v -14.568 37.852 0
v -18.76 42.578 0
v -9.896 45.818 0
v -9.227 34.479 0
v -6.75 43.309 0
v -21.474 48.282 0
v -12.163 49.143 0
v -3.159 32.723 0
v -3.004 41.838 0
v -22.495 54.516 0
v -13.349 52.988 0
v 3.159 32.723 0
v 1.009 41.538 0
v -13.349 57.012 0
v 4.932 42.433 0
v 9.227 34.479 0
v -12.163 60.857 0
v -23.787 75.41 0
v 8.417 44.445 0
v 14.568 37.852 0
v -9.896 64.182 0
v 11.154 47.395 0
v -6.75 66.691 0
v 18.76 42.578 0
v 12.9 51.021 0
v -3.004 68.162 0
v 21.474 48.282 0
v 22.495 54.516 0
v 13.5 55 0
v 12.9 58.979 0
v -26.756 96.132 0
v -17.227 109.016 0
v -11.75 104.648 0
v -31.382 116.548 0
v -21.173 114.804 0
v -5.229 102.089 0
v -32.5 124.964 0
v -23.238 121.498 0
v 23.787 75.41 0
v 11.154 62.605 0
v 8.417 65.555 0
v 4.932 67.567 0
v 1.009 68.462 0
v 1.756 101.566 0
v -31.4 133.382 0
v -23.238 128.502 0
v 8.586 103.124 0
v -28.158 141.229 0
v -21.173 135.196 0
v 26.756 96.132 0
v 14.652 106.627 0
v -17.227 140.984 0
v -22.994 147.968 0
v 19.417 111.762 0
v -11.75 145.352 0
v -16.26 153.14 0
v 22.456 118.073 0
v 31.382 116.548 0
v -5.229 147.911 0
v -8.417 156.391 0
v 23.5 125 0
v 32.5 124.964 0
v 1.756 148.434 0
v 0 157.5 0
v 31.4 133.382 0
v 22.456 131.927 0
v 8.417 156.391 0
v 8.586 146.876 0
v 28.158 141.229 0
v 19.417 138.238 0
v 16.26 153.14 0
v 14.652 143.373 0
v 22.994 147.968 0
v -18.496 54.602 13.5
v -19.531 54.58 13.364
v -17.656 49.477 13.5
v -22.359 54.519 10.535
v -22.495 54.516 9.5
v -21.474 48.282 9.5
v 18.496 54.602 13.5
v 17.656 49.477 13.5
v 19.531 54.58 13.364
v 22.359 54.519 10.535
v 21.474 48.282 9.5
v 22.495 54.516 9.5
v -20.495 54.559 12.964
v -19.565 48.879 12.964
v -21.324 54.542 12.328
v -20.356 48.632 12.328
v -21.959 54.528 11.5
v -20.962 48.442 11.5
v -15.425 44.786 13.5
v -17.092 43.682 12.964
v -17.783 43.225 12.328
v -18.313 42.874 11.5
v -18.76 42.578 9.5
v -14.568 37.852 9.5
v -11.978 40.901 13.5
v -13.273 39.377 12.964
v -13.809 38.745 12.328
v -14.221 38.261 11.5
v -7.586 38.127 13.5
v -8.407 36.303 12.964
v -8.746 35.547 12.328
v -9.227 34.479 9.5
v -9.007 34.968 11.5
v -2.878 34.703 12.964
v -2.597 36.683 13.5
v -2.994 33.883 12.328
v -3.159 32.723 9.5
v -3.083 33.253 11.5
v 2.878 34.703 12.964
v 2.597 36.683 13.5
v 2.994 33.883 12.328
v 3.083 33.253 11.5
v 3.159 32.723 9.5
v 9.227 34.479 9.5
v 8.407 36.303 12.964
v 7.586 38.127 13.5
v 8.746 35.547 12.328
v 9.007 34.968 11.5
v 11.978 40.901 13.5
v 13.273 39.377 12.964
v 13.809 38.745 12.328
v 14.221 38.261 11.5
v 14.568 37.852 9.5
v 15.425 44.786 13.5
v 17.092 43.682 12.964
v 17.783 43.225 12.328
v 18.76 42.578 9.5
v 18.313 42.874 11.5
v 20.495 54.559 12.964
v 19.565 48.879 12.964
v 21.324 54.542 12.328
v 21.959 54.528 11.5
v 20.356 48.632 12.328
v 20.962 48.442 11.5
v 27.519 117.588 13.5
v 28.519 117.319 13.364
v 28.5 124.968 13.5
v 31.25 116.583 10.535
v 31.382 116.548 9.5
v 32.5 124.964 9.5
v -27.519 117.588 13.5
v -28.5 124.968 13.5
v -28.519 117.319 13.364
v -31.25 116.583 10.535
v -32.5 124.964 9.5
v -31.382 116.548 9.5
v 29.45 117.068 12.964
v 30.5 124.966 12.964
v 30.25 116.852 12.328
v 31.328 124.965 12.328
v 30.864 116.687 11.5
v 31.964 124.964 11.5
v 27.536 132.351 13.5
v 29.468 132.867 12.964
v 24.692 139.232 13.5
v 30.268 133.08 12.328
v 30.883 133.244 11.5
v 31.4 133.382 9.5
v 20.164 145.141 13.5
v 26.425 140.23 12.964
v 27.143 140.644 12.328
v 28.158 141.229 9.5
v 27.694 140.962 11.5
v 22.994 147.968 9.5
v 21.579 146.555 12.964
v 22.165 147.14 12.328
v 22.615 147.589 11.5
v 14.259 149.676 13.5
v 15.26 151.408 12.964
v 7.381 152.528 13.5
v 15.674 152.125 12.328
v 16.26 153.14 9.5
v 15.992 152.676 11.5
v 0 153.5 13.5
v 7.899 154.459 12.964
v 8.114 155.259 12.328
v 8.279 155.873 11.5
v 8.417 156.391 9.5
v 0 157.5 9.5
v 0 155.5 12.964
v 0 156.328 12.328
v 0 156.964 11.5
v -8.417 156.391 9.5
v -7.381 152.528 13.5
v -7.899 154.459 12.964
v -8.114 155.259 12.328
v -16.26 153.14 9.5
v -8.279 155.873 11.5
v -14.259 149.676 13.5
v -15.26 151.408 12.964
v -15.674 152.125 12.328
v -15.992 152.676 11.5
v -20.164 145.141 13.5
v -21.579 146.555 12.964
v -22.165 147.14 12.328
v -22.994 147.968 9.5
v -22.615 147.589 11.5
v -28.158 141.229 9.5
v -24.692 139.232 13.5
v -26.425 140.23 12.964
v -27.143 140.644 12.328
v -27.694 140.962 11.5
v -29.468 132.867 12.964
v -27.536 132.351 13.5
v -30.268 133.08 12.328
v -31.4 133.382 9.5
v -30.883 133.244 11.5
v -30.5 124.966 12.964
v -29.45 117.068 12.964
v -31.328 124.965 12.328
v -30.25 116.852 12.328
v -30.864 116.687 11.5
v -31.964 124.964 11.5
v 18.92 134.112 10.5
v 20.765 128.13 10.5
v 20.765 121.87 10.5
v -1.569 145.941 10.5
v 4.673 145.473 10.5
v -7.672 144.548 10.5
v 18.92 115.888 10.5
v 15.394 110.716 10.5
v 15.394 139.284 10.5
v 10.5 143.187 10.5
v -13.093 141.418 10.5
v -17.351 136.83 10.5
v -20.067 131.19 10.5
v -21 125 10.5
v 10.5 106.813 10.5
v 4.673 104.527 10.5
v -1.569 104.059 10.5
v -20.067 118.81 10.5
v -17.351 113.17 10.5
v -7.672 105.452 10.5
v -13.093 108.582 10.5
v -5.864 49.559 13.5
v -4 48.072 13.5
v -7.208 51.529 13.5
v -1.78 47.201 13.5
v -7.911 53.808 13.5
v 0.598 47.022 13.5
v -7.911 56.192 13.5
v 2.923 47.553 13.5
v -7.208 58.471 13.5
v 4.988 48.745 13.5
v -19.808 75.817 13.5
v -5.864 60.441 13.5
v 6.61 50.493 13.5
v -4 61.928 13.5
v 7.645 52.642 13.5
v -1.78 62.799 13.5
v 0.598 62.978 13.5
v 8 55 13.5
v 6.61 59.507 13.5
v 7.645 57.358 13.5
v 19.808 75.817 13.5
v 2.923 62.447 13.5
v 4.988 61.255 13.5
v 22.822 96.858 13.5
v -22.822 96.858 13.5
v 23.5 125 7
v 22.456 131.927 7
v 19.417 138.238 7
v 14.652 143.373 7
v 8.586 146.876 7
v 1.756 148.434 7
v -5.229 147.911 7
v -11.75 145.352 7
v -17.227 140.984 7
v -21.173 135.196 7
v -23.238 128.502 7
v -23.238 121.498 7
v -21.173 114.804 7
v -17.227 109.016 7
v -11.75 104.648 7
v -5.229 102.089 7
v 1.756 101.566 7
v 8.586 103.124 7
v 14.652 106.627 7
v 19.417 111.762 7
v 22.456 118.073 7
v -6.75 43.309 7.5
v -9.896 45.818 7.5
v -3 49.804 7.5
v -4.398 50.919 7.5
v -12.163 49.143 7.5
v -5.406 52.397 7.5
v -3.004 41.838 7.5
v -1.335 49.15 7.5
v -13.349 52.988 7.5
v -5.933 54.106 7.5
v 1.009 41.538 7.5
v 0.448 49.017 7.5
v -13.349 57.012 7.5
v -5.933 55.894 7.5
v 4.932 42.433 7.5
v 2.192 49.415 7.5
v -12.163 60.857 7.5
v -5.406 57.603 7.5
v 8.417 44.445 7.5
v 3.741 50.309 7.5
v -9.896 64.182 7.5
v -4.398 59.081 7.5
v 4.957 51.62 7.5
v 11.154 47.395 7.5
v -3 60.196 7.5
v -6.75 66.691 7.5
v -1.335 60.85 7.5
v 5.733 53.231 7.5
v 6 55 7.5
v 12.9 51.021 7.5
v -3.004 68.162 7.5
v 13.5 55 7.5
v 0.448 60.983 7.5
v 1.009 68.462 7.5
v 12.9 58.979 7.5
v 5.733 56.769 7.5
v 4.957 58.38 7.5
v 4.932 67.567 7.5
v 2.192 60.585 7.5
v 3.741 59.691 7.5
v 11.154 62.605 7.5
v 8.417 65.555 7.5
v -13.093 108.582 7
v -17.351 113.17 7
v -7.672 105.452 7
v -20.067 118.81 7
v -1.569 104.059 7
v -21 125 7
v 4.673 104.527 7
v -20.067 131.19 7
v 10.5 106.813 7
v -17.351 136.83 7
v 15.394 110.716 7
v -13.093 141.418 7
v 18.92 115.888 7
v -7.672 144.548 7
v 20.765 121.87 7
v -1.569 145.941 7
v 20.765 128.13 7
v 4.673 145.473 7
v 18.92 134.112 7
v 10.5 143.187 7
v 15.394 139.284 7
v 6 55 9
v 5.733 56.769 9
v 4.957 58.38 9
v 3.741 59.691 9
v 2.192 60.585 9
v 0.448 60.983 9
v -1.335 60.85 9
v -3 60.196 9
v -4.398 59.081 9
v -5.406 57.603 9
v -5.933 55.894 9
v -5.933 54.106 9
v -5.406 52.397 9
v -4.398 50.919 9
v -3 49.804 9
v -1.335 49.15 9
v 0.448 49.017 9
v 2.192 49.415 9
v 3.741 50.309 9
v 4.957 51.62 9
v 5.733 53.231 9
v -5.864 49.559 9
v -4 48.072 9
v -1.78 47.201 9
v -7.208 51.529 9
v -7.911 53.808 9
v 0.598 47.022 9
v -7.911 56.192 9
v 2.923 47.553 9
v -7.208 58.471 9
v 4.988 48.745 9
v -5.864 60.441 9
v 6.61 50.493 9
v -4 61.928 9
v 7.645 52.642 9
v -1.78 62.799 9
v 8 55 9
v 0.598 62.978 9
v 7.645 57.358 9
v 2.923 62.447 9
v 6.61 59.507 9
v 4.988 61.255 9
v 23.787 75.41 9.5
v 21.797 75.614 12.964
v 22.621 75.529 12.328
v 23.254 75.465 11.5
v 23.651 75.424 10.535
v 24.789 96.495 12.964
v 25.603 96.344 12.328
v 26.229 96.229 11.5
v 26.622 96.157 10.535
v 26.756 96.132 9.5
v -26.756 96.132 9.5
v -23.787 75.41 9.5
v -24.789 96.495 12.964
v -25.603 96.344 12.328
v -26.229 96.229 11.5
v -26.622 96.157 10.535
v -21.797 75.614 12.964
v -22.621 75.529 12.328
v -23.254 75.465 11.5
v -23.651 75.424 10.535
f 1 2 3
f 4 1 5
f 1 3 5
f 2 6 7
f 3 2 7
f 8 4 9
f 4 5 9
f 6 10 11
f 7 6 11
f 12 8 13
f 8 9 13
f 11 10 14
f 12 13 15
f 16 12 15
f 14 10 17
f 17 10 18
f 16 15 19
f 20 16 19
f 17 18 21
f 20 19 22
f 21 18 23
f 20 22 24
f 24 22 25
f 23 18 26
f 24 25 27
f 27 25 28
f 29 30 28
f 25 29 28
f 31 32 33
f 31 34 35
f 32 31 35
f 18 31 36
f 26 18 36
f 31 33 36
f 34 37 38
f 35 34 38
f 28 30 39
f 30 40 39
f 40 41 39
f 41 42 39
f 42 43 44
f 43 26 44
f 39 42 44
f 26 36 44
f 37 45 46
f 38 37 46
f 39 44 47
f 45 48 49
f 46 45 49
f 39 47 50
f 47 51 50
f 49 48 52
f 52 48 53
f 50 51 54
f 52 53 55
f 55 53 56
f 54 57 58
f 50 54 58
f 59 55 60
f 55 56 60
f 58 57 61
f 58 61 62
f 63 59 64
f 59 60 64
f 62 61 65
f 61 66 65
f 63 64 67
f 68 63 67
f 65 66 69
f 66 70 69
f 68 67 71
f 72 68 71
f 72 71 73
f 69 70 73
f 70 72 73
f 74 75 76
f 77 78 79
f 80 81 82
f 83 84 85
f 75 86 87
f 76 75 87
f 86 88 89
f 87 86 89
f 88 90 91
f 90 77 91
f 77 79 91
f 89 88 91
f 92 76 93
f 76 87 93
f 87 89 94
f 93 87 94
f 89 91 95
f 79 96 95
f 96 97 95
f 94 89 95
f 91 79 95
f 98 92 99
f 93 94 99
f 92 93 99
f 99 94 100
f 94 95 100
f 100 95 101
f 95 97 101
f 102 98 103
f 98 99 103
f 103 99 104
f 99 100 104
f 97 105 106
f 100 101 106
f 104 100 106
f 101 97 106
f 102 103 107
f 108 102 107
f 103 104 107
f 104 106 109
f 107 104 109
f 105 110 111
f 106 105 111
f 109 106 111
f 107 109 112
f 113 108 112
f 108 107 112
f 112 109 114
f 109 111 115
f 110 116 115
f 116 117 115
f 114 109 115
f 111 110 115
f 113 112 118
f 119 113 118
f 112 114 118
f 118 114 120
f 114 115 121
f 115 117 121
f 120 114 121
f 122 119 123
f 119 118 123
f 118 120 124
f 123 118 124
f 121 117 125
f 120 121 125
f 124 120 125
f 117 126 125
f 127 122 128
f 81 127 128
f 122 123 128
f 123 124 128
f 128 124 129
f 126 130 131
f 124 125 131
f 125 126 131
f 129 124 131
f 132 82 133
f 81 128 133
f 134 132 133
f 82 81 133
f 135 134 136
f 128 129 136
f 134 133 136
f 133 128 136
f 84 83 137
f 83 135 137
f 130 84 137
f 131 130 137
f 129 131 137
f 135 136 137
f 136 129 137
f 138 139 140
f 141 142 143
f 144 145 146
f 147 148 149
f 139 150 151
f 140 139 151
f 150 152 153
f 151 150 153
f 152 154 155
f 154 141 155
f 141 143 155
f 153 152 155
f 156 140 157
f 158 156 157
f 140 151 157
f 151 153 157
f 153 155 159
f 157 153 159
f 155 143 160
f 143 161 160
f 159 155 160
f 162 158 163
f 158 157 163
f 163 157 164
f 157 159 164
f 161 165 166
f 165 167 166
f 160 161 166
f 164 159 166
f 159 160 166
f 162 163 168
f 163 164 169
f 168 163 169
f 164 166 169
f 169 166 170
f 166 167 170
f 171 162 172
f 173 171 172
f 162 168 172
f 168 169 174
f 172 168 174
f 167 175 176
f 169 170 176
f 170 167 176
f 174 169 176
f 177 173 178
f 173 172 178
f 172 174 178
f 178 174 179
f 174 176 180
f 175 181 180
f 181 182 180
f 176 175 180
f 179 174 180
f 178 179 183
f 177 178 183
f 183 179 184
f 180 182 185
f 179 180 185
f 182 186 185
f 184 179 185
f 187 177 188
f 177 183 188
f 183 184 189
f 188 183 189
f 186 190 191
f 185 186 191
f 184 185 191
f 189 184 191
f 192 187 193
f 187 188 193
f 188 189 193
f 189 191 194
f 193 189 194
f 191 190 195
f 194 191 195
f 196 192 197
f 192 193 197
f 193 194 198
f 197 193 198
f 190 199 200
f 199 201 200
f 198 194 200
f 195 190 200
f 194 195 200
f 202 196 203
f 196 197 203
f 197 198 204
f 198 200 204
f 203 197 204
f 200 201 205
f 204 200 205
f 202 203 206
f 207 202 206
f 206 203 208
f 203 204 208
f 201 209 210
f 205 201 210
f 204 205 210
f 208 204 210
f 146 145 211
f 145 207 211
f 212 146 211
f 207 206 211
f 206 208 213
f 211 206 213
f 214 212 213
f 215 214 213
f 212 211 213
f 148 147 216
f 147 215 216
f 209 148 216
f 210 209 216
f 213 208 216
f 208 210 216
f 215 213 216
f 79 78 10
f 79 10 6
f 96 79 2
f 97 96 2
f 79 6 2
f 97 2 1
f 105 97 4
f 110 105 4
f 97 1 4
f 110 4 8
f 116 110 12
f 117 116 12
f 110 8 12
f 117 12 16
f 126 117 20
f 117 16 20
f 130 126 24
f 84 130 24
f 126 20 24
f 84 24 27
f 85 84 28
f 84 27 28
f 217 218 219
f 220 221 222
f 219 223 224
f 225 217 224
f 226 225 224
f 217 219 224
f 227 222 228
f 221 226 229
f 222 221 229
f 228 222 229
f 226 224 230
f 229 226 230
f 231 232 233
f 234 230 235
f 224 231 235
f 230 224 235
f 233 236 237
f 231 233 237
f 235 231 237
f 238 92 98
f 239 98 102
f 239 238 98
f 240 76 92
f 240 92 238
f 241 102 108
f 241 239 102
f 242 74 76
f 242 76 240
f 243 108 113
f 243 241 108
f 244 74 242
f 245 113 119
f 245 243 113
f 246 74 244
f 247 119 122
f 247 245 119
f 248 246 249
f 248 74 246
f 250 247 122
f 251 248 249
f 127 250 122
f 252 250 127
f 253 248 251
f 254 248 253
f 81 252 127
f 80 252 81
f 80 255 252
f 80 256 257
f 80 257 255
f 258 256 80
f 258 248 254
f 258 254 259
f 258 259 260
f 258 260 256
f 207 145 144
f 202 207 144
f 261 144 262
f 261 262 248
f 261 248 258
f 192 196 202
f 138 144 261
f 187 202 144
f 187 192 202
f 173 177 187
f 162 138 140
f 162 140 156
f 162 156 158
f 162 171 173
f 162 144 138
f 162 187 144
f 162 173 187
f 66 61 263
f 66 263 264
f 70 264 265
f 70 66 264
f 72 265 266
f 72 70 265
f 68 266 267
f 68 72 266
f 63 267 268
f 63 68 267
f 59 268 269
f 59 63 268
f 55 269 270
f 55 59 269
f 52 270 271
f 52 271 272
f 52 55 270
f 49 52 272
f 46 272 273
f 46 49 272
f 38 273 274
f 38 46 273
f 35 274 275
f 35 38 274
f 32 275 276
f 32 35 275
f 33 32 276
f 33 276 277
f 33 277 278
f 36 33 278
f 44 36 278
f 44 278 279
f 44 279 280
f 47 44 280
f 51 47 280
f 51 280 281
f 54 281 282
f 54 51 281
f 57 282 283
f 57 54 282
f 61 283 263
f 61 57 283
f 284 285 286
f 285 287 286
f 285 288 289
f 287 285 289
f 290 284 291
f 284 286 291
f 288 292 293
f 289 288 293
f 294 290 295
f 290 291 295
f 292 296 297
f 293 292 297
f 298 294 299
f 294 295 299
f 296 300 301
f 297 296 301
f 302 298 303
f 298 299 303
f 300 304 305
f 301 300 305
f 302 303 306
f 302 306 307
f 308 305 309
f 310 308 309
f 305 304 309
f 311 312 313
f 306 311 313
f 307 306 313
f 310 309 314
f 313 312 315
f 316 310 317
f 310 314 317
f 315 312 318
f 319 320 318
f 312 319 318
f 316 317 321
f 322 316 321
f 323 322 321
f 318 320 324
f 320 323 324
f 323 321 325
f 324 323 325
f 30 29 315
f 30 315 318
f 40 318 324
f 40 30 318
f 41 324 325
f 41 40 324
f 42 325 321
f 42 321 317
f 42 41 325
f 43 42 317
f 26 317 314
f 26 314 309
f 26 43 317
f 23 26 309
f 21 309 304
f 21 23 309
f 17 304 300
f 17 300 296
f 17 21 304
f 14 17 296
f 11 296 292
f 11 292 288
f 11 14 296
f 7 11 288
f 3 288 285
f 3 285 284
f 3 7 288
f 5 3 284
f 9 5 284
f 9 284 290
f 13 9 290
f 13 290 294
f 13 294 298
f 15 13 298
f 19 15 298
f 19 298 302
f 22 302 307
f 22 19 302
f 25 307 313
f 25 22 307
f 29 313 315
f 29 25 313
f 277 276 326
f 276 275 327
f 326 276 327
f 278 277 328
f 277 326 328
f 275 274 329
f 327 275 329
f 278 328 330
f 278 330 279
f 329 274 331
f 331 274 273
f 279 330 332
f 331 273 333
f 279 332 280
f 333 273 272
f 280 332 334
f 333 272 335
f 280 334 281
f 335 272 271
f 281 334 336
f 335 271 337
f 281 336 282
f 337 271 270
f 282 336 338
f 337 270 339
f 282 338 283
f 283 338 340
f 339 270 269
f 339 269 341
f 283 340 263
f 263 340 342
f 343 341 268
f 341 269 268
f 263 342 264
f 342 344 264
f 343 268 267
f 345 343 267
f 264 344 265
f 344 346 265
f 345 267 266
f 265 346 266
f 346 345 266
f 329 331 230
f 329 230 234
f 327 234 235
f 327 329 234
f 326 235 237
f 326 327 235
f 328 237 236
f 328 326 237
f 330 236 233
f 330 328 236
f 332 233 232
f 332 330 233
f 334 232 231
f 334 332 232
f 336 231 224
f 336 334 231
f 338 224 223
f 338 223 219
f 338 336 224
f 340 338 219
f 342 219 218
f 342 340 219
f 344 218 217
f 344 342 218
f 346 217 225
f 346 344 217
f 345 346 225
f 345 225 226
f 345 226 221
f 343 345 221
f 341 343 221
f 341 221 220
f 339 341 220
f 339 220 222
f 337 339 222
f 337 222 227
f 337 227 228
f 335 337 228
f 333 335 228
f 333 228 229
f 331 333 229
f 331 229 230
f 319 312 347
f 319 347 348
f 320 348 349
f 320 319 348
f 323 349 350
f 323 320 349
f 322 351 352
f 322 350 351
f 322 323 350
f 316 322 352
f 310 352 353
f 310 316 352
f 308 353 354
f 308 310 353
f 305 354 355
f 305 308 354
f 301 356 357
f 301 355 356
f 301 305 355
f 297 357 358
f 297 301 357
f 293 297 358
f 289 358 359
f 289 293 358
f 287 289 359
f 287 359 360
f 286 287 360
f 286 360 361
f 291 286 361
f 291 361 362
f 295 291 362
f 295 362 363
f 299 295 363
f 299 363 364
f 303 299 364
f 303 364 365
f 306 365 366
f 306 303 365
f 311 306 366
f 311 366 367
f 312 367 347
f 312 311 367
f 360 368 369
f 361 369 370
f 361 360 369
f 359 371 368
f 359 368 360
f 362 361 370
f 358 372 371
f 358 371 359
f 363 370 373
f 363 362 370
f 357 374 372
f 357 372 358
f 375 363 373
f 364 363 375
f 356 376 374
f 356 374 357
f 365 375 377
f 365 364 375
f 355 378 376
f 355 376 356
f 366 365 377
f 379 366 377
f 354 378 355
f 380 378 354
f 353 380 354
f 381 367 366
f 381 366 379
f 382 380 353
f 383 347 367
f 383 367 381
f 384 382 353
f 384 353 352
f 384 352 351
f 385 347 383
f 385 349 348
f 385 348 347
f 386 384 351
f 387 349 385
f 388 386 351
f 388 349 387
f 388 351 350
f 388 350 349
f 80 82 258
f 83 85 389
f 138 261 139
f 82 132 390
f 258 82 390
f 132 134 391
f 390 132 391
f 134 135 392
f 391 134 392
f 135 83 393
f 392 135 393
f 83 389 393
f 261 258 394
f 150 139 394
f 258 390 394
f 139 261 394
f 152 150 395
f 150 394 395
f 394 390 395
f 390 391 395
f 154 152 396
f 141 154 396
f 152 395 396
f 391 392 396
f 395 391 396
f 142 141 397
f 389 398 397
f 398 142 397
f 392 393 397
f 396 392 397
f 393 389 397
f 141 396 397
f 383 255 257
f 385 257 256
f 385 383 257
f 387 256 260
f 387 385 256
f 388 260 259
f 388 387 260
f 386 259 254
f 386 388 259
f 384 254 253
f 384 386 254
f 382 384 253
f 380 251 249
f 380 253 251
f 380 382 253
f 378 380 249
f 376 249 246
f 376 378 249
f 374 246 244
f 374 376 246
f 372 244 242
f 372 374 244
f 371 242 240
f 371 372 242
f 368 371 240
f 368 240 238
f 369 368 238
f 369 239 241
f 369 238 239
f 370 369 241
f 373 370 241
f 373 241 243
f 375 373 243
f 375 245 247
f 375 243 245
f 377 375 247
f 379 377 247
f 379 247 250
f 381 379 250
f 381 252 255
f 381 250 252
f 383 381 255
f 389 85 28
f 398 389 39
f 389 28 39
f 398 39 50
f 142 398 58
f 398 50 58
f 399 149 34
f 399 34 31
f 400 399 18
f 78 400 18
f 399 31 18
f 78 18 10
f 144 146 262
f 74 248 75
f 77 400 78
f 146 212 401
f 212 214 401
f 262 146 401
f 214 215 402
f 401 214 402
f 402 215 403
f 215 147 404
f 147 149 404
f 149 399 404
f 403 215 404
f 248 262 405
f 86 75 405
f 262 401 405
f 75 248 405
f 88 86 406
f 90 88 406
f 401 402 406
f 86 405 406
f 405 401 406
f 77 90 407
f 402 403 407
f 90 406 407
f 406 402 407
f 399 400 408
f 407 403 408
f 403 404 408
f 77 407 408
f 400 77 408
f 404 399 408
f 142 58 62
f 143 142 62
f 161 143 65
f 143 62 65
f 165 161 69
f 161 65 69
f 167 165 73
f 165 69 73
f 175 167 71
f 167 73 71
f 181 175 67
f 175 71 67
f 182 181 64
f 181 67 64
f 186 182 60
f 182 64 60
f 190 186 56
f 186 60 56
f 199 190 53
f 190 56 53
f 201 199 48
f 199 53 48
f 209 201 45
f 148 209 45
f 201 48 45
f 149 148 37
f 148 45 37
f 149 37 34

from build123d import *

# Parameters (mm, degrees)
EXTRUDE_2_DEPTH     = 13.5
SKETCH_3_R          = 6
CUT_EXTRUDE_1_DEPTH = 162.383859168
CUT_EXTRUDE_START   = 9
SKETCH_3_3_R        = 8
CUT_EXTRUDE_2_DEPTH = 153.383859168
SKETCH_3_4_R        = 13.5
CUT_EXTRUDE_3_DEPTH = 7.5
FILLET_1_R          = 4
SKETCH_3_5_R        = 21
CUT_EXTRUDE_5_DEPTH = 10.5
SKETCH_3_6_R        = 23.5
CUT_EXTRUDE_7_DEPTH = 7


with BuildPart() as part:
    # Эскиз2 → Бобышка-Вытянуть2 (new body)
    with BuildSketch(Plane.XY):
        with BuildLine():
            ThreePointArc((-31.381638839, 116.547619048), (-25.062561701, 85.800741423), (-22.494803062, 54.516434893))
            ThreePointArc((-22.494803062, 54.516434893), (0, 32.5), (22.494803062, 54.516434893))
            ThreePointArc((22.494803062, 54.516434893), (25.062561701, 85.800741423), (31.381638839, 116.547619048))
            ThreePointArc((31.381638839, 116.547619048), (0, 157.5), (-31.381638839, 116.547619048))
        make_face()
    extrude(amount=EXTRUDE_2_DEPTH)

    # Эскиз3 → Вырез-Вытянуть1 (cut, through all)
    with BuildSketch(Plane.XY):
        with Locations((0, 55)):
            Circle(SKETCH_3_R)
    extrude(amount=CUT_EXTRUDE_1_DEPTH, mode=Mode.SUBTRACT)

    # Эскиз3<3> → Вырез-Вытянуть2 (cut, through all)
    with BuildSketch(Plane.XY.offset(CUT_EXTRUDE_START)):
        with Locations((0, 55)):
            Circle(SKETCH_3_3_R)
    extrude(amount=CUT_EXTRUDE_2_DEPTH, mode=Mode.SUBTRACT)

    # Эскиз3<4> → Вырез-Вытянуть3 (cut)
    with BuildSketch(Plane.XY):
        with Locations((0, 55)):
            Circle(SKETCH_3_4_R)
    extrude(amount=CUT_EXTRUDE_3_DEPTH, mode=Mode.SUBTRACT)

    # Скругление1
    fillet_1_edges = [part.edges().sort_by_distance(p)[0] for p in [
        (25.062561701, 85.800741423, 13.5),
        (0, 157.5, 13.5),
        (-25.062561701, 85.800741423, 13.5),
        (0, 32.5, 13.5),
    ]]
    fillet(fillet_1_edges, radius=FILLET_1_R)

    # Эскиз3<5> → Вырез-Вытянуть5 (cut)
    with BuildSketch(Plane.XY):
        with Locations(Location((0, 125, 0), (0, 0, 180))):
            Circle(SKETCH_3_5_R)
    extrude(amount=CUT_EXTRUDE_5_DEPTH, mode=Mode.SUBTRACT)

    # Эскиз3<6> → Вырез-Вытянуть7 (cut)
    with BuildSketch(Plane.XY):
        with Locations((0, 125)):
            Circle(SKETCH_3_6_R)
    extrude(amount=CUT_EXTRUDE_7_DEPTH, mode=Mode.SUBTRACT)


solid = part.part
